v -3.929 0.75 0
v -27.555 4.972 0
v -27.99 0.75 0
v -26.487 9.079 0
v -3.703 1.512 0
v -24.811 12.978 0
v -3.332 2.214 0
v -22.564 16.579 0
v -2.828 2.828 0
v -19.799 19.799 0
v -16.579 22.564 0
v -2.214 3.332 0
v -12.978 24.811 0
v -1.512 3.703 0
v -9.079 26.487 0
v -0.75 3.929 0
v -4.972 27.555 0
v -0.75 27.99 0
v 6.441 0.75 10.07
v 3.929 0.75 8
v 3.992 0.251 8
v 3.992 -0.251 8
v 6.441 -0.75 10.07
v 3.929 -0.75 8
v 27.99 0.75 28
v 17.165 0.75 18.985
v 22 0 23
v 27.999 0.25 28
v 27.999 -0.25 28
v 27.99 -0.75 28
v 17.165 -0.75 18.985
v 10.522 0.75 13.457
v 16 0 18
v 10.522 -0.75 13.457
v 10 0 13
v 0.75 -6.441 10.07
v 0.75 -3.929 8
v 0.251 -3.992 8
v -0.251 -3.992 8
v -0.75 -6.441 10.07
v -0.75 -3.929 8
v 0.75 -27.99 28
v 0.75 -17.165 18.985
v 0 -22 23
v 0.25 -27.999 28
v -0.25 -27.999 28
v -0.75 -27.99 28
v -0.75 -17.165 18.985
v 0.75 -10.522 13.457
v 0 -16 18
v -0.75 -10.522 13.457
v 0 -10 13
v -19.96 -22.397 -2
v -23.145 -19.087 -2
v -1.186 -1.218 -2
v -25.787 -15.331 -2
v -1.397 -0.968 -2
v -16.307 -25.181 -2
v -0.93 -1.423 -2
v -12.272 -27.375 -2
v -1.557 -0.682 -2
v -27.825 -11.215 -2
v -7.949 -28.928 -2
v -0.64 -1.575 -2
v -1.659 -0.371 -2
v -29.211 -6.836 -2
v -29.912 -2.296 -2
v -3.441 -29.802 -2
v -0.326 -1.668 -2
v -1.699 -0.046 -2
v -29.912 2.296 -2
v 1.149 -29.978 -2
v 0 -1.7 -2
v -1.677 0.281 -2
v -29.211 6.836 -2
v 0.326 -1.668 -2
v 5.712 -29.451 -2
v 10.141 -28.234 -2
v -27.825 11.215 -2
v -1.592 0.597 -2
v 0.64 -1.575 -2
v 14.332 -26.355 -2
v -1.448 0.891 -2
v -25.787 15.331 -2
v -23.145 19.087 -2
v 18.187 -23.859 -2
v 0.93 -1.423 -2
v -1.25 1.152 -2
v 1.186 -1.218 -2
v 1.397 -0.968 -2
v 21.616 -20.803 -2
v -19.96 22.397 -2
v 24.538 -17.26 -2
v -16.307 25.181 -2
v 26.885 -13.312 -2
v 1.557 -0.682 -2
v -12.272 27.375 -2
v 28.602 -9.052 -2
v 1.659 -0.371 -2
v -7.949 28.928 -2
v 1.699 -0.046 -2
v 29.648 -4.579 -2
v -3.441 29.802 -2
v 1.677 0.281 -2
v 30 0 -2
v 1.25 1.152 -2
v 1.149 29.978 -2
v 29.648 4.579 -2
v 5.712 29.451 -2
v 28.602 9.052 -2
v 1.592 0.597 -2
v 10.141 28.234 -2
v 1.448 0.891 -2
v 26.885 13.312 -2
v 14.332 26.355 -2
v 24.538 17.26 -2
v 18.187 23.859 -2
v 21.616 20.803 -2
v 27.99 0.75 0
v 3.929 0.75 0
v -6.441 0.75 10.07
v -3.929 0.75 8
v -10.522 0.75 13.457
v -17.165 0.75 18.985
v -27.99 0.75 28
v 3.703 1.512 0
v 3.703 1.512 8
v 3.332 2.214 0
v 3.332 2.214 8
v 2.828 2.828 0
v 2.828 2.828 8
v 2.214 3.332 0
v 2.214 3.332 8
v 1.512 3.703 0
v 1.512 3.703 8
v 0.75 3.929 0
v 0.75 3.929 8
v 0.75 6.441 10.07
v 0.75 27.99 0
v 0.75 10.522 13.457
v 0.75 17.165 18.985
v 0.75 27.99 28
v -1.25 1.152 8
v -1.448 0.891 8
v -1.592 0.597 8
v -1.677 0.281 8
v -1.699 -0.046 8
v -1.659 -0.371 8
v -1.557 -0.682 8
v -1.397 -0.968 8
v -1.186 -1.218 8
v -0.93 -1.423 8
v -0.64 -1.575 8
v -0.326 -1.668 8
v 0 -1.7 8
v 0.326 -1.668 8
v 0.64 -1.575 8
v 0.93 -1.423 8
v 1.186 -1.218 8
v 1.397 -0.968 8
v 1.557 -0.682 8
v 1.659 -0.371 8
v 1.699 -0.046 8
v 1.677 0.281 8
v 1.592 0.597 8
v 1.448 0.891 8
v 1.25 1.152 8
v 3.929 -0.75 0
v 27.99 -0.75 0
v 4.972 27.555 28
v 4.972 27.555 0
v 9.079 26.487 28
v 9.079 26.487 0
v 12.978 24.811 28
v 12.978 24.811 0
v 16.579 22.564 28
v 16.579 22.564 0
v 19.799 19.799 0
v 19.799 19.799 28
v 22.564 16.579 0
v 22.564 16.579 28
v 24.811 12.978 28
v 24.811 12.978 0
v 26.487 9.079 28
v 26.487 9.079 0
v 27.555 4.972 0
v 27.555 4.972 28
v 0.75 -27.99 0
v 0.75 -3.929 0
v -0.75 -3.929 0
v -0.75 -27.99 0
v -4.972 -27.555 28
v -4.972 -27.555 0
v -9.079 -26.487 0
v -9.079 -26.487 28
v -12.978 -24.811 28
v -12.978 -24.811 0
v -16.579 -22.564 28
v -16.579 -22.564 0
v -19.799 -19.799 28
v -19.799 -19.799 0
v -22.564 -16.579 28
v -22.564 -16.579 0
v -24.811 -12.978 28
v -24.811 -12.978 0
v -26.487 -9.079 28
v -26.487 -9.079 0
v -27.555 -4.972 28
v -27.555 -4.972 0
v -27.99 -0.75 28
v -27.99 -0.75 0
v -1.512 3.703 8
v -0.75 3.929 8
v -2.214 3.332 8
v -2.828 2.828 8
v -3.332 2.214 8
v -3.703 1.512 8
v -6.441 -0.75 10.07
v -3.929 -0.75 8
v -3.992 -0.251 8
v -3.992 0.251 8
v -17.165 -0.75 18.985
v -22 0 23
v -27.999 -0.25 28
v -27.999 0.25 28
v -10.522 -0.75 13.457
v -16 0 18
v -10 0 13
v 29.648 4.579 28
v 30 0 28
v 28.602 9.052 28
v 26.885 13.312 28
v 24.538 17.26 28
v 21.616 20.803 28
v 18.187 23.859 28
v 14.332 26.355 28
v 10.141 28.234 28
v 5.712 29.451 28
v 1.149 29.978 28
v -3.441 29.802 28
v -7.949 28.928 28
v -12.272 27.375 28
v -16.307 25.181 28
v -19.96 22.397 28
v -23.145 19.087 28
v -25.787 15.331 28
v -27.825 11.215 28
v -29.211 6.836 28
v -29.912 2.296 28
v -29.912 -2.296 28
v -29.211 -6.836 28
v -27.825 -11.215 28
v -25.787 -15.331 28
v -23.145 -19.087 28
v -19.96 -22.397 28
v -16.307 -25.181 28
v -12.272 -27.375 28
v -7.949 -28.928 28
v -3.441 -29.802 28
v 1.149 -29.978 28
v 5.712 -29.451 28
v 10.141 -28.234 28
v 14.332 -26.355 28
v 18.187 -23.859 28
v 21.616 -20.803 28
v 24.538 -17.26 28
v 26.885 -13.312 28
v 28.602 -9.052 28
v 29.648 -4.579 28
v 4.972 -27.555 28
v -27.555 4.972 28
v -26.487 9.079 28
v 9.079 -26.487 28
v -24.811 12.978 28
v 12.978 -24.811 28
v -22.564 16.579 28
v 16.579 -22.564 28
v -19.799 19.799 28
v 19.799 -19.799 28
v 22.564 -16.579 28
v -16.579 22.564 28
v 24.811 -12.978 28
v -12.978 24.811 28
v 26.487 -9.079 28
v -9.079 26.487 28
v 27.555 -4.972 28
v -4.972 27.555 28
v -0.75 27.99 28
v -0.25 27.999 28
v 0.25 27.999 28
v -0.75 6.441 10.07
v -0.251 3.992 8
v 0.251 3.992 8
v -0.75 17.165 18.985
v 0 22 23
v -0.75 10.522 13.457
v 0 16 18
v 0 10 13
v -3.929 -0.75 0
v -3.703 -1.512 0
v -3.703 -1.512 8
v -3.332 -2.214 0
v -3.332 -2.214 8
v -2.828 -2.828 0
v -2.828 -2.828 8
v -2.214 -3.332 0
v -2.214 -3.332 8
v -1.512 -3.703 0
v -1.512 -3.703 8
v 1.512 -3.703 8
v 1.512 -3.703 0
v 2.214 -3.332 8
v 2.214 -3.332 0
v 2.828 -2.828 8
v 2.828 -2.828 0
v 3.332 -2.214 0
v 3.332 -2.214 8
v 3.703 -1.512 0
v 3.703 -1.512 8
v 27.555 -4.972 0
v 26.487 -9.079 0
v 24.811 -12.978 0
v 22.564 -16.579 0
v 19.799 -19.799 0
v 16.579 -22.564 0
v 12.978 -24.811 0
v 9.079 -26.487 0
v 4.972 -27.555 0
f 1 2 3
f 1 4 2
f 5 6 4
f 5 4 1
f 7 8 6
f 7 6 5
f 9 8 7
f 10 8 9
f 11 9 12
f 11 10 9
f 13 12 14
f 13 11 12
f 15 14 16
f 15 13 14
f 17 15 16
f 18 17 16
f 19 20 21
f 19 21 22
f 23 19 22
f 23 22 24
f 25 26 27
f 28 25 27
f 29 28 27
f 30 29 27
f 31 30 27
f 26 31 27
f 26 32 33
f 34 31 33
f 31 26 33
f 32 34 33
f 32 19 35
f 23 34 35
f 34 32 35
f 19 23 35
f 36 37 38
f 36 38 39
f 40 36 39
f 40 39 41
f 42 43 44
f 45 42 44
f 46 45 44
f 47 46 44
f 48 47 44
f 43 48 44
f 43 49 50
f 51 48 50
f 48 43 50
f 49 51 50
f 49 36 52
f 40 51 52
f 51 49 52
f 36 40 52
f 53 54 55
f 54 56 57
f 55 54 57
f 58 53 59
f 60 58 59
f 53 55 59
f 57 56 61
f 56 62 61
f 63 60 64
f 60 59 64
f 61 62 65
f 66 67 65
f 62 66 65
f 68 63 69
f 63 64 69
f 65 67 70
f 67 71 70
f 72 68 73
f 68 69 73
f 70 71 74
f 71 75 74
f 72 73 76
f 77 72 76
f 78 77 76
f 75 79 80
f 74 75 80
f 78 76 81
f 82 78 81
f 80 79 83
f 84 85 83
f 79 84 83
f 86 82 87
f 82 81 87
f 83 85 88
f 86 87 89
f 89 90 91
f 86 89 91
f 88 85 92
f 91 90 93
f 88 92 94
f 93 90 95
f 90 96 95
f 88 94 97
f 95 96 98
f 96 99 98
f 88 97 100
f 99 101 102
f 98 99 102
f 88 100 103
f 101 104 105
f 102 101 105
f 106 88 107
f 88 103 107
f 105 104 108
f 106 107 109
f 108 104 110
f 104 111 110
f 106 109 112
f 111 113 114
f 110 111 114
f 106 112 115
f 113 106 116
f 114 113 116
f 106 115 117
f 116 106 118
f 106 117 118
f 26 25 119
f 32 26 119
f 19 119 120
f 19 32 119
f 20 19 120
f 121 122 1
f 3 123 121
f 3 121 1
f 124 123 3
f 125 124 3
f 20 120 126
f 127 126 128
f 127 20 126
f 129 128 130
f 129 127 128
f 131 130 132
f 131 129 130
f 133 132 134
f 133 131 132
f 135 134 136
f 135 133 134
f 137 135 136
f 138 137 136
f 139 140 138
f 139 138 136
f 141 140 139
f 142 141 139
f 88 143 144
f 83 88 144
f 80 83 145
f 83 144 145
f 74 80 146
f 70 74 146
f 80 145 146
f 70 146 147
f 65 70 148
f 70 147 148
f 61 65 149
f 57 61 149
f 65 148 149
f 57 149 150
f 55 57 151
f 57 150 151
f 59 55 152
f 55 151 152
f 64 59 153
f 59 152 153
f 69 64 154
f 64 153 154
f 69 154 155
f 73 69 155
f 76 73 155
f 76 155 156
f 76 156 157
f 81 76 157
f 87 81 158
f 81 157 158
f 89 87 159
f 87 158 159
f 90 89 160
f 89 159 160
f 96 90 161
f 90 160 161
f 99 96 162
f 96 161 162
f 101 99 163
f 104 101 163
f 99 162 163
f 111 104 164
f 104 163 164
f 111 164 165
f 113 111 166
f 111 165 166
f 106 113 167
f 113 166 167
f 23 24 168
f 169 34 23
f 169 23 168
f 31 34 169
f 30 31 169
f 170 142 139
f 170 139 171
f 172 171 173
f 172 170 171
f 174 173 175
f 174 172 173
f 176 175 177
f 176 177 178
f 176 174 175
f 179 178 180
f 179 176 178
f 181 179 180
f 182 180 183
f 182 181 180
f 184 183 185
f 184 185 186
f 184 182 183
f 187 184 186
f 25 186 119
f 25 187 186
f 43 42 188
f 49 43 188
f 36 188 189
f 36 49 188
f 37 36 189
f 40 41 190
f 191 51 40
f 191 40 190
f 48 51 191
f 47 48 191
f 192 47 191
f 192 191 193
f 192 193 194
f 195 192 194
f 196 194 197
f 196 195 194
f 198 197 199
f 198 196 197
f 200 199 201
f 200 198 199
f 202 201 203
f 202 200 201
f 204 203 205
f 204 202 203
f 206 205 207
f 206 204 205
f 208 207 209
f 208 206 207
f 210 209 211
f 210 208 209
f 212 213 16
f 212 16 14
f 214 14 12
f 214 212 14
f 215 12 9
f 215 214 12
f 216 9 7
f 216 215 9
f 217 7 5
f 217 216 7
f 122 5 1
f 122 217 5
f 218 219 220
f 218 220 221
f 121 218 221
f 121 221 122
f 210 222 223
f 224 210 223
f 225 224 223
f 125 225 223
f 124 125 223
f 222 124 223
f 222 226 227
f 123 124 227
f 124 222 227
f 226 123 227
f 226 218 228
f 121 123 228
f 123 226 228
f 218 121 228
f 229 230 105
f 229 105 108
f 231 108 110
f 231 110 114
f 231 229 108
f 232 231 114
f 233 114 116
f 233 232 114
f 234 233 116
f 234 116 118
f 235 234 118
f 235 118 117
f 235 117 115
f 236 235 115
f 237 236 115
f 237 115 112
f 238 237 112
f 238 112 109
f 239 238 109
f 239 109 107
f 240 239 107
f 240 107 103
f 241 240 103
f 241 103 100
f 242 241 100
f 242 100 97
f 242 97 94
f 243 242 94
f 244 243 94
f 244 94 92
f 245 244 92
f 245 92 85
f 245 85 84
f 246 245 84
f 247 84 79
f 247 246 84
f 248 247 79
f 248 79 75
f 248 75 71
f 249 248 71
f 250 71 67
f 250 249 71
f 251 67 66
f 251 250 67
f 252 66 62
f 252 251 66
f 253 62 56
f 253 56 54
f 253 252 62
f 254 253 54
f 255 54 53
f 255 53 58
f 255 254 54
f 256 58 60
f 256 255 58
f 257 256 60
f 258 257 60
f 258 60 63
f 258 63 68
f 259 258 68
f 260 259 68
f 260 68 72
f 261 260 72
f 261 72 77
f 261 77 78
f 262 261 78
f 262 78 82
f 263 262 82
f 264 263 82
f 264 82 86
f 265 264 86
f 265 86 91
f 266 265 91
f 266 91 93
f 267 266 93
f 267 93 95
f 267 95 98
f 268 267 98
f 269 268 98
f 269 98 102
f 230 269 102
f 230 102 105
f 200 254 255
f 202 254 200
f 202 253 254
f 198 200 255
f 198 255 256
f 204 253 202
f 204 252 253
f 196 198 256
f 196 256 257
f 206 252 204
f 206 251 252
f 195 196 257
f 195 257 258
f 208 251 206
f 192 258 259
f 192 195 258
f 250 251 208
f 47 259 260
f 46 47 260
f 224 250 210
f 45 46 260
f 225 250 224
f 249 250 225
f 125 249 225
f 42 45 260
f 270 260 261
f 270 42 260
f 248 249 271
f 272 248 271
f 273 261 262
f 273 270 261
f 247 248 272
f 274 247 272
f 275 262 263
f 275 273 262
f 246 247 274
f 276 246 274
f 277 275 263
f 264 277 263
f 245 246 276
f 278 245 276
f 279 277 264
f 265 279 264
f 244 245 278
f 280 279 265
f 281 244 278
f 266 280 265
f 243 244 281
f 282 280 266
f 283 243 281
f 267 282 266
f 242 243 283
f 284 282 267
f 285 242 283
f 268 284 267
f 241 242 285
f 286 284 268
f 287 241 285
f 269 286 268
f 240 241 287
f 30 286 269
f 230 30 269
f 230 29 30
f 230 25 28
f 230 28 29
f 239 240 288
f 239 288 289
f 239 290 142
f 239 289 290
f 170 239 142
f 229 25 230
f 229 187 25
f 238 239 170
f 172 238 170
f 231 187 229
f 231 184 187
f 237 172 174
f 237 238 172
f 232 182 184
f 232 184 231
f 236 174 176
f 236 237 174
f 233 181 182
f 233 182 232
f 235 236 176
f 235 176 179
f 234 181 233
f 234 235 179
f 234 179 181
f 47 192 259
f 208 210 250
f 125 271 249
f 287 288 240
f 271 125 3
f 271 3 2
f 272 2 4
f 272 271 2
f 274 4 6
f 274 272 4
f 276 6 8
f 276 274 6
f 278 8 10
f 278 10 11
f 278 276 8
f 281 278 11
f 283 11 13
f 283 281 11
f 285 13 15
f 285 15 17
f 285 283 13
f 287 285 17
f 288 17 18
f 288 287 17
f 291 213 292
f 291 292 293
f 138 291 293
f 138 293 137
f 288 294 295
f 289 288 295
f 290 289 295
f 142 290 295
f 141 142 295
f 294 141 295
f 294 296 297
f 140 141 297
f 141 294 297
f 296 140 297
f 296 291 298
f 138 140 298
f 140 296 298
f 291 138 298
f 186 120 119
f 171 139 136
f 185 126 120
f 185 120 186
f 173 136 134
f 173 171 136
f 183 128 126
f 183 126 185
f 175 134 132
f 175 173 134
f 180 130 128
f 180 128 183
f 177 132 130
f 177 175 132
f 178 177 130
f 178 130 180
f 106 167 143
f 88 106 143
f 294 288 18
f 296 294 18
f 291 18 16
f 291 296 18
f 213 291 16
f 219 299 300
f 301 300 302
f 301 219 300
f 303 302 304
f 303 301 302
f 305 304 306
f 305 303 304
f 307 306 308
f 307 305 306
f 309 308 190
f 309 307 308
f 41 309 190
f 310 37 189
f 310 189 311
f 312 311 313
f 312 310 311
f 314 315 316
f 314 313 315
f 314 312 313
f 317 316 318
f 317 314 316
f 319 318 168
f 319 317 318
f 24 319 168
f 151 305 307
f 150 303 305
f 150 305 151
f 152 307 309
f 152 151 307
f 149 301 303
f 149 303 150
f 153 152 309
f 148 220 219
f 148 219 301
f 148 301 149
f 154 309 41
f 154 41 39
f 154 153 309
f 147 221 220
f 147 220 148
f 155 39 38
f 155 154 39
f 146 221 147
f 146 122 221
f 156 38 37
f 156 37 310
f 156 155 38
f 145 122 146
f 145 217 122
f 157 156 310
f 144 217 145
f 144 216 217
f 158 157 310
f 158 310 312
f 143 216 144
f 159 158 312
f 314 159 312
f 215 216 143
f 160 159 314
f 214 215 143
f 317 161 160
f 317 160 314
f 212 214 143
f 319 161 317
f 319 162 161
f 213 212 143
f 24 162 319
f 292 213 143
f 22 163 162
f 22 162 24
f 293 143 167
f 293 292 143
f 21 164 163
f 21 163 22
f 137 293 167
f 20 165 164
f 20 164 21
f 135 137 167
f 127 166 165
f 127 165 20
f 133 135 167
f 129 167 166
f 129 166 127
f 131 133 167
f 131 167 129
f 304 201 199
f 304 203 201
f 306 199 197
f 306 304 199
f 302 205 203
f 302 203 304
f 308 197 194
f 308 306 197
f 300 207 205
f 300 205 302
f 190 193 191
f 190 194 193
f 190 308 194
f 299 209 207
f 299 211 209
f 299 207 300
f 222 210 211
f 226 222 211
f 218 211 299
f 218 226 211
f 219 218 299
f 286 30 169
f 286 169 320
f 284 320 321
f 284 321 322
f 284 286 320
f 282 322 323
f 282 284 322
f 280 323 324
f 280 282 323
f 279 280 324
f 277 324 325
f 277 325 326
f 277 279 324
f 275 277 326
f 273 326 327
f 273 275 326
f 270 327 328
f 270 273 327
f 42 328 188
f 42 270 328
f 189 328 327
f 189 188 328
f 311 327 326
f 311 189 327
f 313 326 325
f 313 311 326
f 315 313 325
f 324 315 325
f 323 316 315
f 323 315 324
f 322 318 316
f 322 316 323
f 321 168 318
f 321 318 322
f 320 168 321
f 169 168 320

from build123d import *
from OCP.BRepFilletAPI import BRepFilletAPI_MakeChamfer

# Parameters (mm, degrees)
SKETCH1_R                      = 30
SKETCH1_R_2                    = 28
SKETCH1_R_3                    = 4
BOSS_EXTRUDE1_DEPTH            = 2
BOSS_EXTRUDE2_START            = 8
SKETCH1_3_R                    = 4
BOSS_EXTRUDE2_DEPTH            = 8
BOSS_EXTRUDE3_START            = 28
SKETCH1_4_R                    = 30
BOSS_EXTRUDE3_DEPTH            = 28
CHAMFER1_SIZE2                 = 20
CHAMFER1_SIZE                  = 24
CIRPATTERN1_COUNT              = 4
CHAMFER1_OF_CIRPATTERN1_SIZE   = 24
CHAMFER1_OF_CIRPATTERN1_SIZE_2 = 20


with BuildPart() as part:
    # Sketch1 → Boss-Extrude1 (new body)
    # profile 1 of 6: a face of its own
    with BuildSketch(Plane.XY):
        Circle(SKETCH1_R)
        Circle(SKETCH1_R_2, mode=Mode.SUBTRACT)
    # profile 2 of 6: a face of its own
    with BuildSketch(Plane.XY):
        with BuildLine():
            Line((-0.75, 27.989953555), (-0.75, 3.929058411))
            ThreePointArc((-0.75, 3.929058411), (0, 4), (0.75, 3.929058411))
            Line((0.75, 3.929058411), (0.75, 27.989953555))
            ThreePointArc((0.75, 27.989953555), (0, 28), (-0.75, 27.989953555))
        make_face()
    # profile 3 of 6: a face of its own
    with BuildSketch(Plane.XY):
        with BuildLine():
            ThreePointArc((4, 0), (-2.549509757, -3.082207001), (-0.75, 3.929058411))
            Line((-0.75, 3.929058411), (-0.75, 27.989953555))
            ThreePointArc((-0.75, 27.989953555), (-19.532024985, -20.062402648), (28, 0))
            ThreePointArc((28, 0), (20.062402648, 19.532024985), (0.75, 27.989953555))
            Line((0.75, 27.989953555), (0.75, 3.929058411))
            ThreePointArc((0.75, 3.929058411), (3.082207001, 2.549509757), (4, 0))
        make_face()
    # profile 4 of 6: a face of its own
    with BuildSketch(Plane.XY):
        with BuildLine():
            ThreePointArc((4, 0), (-2.549509757, -3.082207001), (-0.75, 3.929058411))
            Line((-0.75, 3.929058411), (-0.75, 27.989953555))
            ThreePointArc((-0.75, 27.989953555), (-19.532024985, -20.062402648), (28, 0))
            ThreePointArc((28, 0), (20.062402648, 19.532024985), (0.75, 27.989953555))
            Line((0.75, 27.989953555), (0.75, 3.929058411))
            ThreePointArc((0.75, 3.929058411), (3.082207001, 2.549509757), (4, 0))
        make_face()
    # profile 5 of 6: a face of its own
    with BuildSketch(Plane.XY):
        with BuildLine():
            Line((-0.75, 27.989953555), (-0.75, 3.929058411))
            ThreePointArc((-0.75, 3.929058411), (0, 4), (0.75, 3.929058411))
            Line((0.75, 3.929058411), (0.75, 27.989953555))
            ThreePointArc((0.75, 27.989953555), (0, 28), (-0.75, 27.989953555))
        make_face()
    # profile 6 of 6: a face of its own
    with BuildSketch(Plane.XY):
        Circle(SKETCH1_R_3)
        with BuildLine():
            ThreePointArc((-1.25, 1.152171862), (0, -1.7), (1.25, 1.152171862))
            Line((1.25, 1.152171862), (-1.25, 1.152171862))
        make_face(mode=Mode.SUBTRACT)
    extrude(amount=-BOSS_EXTRUDE1_DEPTH)

    # Sketch1<3> → Boss-Extrude2 (add)
    with BuildSketch(Plane.XY.offset(BOSS_EXTRUDE2_START)):
        Circle(SKETCH1_3_R)
        with BuildLine():
            ThreePointArc((-1.25, 1.152171862), (0, -1.7), (1.25, 1.152171862))
            Line((1.25, 1.152171862), (-1.25, 1.152171862))
        make_face(mode=Mode.SUBTRACT)
    extrude(amount=-BOSS_EXTRUDE2_DEPTH)

    # Sketch1<4> → Boss-Extrude3 (add)
    with BuildSketch(Plane.XY.offset(BOSS_EXTRUDE3_START)):
        Circle(SKETCH1_4_R)
        with BuildLine():
            Line((-0.75, 27.989953555), (-0.75, 3.929058411))
            ThreePointArc((-0.75, 3.929058411), (0, 4), (0.75, 3.929058411))
            Line((0.75, 3.929058411), (0.75, 27.989953555))
            ThreePointArc((0.75, 27.989953555), (0, -28), (-0.75, 27.989953555))
        make_face(mode=Mode.SUBTRACT)
    boss_extrude3 = extrude(amount=-BOSS_EXTRUDE3_DEPTH)

    # Chamfer1
    chamfer1_edges = [part.edges().sort_by_distance(p)[0] for p in [
        (0, 4, 28),
    ]]
    chamfer1_side = [part.faces().sort_by_distance(p)[0] for p in [
        (0, 4.4, 28),
    ]]
    chamfer(chamfer1_edges, length=CHAMFER1_SIZE - 0.0001, length2=CHAMFER1_SIZE2 - 0.0001, reference=chamfer1_side[0])  # a hair under: the kernel refuses the full size

    # CirPattern1: Boss-Extrude3 ×4 about axis
    cirpattern1_axis = Axis((0, 0, 0), (0, 0, 1))
    for i in range(1, CIRPATTERN1_COUNT):
        add(boss_extrude3.rotate(cirpattern1_axis, i * 360 / CIRPATTERN1_COUNT))

    # Chamfer1 of CirPattern1
    chamfer1_of_cirpattern1_edges_1 = [part.edges().sort_by_distance(p)[0] for p in [
        (-4, 0, 28),
    ]]
    chamfer1_of_cirpattern1_side_1 = [part.faces().sort_by_distance(p)[0] for p in [
        (-4.4, 0, 28),
    ]]
    chamfer1_of_cirpattern1_edges_2 = [part.edges().sort_by_distance(p)[0] for p in [
        (0, -4, 28),
    ]]
    chamfer1_of_cirpattern1_side_2 = [part.faces().sort_by_distance(p)[0] for p in [
        (0, -4.4, 28),
    ]]
    chamfer1_of_cirpattern1_edges_3 = [part.edges().sort_by_distance(p)[0] for p in [
        (4, 0, 28),
    ]]
    chamfer1_of_cirpattern1_side_3 = [part.faces().sort_by_distance(p)[0] for p in [
        (4.4, 0, 28),
    ]]
    chamfer1_of_cirpattern1 = BRepFilletAPI_MakeChamfer(part.part.solid().wrapped)
    for e in chamfer1_of_cirpattern1_edges_1:
        chamfer1_of_cirpattern1.Add(CHAMFER1_OF_CIRPATTERN1_SIZE - 0.0001, CHAMFER1_OF_CIRPATTERN1_SIZE_2 - 0.0001, e.wrapped, chamfer1_of_cirpattern1_side_1[0].wrapped)
    for e in chamfer1_of_cirpattern1_edges_2:
        chamfer1_of_cirpattern1.Add(CHAMFER1_OF_CIRPATTERN1_SIZE - 0.0001, CHAMFER1_OF_CIRPATTERN1_SIZE_2 - 0.0001, e.wrapped, chamfer1_of_cirpattern1_side_2[0].wrapped)
    for e in chamfer1_of_cirpattern1_edges_3:
        chamfer1_of_cirpattern1.Add(CHAMFER1_OF_CIRPATTERN1_SIZE - 0.0001, CHAMFER1_OF_CIRPATTERN1_SIZE_2 - 0.0001, e.wrapped, chamfer1_of_cirpattern1_side_3[0].wrapped)
    add(Compound.cast(chamfer1_of_cirpattern1.Shape()), mode=Mode.REPLACE)  # a hair under: the kernel refuses the full size


solid = part.part
